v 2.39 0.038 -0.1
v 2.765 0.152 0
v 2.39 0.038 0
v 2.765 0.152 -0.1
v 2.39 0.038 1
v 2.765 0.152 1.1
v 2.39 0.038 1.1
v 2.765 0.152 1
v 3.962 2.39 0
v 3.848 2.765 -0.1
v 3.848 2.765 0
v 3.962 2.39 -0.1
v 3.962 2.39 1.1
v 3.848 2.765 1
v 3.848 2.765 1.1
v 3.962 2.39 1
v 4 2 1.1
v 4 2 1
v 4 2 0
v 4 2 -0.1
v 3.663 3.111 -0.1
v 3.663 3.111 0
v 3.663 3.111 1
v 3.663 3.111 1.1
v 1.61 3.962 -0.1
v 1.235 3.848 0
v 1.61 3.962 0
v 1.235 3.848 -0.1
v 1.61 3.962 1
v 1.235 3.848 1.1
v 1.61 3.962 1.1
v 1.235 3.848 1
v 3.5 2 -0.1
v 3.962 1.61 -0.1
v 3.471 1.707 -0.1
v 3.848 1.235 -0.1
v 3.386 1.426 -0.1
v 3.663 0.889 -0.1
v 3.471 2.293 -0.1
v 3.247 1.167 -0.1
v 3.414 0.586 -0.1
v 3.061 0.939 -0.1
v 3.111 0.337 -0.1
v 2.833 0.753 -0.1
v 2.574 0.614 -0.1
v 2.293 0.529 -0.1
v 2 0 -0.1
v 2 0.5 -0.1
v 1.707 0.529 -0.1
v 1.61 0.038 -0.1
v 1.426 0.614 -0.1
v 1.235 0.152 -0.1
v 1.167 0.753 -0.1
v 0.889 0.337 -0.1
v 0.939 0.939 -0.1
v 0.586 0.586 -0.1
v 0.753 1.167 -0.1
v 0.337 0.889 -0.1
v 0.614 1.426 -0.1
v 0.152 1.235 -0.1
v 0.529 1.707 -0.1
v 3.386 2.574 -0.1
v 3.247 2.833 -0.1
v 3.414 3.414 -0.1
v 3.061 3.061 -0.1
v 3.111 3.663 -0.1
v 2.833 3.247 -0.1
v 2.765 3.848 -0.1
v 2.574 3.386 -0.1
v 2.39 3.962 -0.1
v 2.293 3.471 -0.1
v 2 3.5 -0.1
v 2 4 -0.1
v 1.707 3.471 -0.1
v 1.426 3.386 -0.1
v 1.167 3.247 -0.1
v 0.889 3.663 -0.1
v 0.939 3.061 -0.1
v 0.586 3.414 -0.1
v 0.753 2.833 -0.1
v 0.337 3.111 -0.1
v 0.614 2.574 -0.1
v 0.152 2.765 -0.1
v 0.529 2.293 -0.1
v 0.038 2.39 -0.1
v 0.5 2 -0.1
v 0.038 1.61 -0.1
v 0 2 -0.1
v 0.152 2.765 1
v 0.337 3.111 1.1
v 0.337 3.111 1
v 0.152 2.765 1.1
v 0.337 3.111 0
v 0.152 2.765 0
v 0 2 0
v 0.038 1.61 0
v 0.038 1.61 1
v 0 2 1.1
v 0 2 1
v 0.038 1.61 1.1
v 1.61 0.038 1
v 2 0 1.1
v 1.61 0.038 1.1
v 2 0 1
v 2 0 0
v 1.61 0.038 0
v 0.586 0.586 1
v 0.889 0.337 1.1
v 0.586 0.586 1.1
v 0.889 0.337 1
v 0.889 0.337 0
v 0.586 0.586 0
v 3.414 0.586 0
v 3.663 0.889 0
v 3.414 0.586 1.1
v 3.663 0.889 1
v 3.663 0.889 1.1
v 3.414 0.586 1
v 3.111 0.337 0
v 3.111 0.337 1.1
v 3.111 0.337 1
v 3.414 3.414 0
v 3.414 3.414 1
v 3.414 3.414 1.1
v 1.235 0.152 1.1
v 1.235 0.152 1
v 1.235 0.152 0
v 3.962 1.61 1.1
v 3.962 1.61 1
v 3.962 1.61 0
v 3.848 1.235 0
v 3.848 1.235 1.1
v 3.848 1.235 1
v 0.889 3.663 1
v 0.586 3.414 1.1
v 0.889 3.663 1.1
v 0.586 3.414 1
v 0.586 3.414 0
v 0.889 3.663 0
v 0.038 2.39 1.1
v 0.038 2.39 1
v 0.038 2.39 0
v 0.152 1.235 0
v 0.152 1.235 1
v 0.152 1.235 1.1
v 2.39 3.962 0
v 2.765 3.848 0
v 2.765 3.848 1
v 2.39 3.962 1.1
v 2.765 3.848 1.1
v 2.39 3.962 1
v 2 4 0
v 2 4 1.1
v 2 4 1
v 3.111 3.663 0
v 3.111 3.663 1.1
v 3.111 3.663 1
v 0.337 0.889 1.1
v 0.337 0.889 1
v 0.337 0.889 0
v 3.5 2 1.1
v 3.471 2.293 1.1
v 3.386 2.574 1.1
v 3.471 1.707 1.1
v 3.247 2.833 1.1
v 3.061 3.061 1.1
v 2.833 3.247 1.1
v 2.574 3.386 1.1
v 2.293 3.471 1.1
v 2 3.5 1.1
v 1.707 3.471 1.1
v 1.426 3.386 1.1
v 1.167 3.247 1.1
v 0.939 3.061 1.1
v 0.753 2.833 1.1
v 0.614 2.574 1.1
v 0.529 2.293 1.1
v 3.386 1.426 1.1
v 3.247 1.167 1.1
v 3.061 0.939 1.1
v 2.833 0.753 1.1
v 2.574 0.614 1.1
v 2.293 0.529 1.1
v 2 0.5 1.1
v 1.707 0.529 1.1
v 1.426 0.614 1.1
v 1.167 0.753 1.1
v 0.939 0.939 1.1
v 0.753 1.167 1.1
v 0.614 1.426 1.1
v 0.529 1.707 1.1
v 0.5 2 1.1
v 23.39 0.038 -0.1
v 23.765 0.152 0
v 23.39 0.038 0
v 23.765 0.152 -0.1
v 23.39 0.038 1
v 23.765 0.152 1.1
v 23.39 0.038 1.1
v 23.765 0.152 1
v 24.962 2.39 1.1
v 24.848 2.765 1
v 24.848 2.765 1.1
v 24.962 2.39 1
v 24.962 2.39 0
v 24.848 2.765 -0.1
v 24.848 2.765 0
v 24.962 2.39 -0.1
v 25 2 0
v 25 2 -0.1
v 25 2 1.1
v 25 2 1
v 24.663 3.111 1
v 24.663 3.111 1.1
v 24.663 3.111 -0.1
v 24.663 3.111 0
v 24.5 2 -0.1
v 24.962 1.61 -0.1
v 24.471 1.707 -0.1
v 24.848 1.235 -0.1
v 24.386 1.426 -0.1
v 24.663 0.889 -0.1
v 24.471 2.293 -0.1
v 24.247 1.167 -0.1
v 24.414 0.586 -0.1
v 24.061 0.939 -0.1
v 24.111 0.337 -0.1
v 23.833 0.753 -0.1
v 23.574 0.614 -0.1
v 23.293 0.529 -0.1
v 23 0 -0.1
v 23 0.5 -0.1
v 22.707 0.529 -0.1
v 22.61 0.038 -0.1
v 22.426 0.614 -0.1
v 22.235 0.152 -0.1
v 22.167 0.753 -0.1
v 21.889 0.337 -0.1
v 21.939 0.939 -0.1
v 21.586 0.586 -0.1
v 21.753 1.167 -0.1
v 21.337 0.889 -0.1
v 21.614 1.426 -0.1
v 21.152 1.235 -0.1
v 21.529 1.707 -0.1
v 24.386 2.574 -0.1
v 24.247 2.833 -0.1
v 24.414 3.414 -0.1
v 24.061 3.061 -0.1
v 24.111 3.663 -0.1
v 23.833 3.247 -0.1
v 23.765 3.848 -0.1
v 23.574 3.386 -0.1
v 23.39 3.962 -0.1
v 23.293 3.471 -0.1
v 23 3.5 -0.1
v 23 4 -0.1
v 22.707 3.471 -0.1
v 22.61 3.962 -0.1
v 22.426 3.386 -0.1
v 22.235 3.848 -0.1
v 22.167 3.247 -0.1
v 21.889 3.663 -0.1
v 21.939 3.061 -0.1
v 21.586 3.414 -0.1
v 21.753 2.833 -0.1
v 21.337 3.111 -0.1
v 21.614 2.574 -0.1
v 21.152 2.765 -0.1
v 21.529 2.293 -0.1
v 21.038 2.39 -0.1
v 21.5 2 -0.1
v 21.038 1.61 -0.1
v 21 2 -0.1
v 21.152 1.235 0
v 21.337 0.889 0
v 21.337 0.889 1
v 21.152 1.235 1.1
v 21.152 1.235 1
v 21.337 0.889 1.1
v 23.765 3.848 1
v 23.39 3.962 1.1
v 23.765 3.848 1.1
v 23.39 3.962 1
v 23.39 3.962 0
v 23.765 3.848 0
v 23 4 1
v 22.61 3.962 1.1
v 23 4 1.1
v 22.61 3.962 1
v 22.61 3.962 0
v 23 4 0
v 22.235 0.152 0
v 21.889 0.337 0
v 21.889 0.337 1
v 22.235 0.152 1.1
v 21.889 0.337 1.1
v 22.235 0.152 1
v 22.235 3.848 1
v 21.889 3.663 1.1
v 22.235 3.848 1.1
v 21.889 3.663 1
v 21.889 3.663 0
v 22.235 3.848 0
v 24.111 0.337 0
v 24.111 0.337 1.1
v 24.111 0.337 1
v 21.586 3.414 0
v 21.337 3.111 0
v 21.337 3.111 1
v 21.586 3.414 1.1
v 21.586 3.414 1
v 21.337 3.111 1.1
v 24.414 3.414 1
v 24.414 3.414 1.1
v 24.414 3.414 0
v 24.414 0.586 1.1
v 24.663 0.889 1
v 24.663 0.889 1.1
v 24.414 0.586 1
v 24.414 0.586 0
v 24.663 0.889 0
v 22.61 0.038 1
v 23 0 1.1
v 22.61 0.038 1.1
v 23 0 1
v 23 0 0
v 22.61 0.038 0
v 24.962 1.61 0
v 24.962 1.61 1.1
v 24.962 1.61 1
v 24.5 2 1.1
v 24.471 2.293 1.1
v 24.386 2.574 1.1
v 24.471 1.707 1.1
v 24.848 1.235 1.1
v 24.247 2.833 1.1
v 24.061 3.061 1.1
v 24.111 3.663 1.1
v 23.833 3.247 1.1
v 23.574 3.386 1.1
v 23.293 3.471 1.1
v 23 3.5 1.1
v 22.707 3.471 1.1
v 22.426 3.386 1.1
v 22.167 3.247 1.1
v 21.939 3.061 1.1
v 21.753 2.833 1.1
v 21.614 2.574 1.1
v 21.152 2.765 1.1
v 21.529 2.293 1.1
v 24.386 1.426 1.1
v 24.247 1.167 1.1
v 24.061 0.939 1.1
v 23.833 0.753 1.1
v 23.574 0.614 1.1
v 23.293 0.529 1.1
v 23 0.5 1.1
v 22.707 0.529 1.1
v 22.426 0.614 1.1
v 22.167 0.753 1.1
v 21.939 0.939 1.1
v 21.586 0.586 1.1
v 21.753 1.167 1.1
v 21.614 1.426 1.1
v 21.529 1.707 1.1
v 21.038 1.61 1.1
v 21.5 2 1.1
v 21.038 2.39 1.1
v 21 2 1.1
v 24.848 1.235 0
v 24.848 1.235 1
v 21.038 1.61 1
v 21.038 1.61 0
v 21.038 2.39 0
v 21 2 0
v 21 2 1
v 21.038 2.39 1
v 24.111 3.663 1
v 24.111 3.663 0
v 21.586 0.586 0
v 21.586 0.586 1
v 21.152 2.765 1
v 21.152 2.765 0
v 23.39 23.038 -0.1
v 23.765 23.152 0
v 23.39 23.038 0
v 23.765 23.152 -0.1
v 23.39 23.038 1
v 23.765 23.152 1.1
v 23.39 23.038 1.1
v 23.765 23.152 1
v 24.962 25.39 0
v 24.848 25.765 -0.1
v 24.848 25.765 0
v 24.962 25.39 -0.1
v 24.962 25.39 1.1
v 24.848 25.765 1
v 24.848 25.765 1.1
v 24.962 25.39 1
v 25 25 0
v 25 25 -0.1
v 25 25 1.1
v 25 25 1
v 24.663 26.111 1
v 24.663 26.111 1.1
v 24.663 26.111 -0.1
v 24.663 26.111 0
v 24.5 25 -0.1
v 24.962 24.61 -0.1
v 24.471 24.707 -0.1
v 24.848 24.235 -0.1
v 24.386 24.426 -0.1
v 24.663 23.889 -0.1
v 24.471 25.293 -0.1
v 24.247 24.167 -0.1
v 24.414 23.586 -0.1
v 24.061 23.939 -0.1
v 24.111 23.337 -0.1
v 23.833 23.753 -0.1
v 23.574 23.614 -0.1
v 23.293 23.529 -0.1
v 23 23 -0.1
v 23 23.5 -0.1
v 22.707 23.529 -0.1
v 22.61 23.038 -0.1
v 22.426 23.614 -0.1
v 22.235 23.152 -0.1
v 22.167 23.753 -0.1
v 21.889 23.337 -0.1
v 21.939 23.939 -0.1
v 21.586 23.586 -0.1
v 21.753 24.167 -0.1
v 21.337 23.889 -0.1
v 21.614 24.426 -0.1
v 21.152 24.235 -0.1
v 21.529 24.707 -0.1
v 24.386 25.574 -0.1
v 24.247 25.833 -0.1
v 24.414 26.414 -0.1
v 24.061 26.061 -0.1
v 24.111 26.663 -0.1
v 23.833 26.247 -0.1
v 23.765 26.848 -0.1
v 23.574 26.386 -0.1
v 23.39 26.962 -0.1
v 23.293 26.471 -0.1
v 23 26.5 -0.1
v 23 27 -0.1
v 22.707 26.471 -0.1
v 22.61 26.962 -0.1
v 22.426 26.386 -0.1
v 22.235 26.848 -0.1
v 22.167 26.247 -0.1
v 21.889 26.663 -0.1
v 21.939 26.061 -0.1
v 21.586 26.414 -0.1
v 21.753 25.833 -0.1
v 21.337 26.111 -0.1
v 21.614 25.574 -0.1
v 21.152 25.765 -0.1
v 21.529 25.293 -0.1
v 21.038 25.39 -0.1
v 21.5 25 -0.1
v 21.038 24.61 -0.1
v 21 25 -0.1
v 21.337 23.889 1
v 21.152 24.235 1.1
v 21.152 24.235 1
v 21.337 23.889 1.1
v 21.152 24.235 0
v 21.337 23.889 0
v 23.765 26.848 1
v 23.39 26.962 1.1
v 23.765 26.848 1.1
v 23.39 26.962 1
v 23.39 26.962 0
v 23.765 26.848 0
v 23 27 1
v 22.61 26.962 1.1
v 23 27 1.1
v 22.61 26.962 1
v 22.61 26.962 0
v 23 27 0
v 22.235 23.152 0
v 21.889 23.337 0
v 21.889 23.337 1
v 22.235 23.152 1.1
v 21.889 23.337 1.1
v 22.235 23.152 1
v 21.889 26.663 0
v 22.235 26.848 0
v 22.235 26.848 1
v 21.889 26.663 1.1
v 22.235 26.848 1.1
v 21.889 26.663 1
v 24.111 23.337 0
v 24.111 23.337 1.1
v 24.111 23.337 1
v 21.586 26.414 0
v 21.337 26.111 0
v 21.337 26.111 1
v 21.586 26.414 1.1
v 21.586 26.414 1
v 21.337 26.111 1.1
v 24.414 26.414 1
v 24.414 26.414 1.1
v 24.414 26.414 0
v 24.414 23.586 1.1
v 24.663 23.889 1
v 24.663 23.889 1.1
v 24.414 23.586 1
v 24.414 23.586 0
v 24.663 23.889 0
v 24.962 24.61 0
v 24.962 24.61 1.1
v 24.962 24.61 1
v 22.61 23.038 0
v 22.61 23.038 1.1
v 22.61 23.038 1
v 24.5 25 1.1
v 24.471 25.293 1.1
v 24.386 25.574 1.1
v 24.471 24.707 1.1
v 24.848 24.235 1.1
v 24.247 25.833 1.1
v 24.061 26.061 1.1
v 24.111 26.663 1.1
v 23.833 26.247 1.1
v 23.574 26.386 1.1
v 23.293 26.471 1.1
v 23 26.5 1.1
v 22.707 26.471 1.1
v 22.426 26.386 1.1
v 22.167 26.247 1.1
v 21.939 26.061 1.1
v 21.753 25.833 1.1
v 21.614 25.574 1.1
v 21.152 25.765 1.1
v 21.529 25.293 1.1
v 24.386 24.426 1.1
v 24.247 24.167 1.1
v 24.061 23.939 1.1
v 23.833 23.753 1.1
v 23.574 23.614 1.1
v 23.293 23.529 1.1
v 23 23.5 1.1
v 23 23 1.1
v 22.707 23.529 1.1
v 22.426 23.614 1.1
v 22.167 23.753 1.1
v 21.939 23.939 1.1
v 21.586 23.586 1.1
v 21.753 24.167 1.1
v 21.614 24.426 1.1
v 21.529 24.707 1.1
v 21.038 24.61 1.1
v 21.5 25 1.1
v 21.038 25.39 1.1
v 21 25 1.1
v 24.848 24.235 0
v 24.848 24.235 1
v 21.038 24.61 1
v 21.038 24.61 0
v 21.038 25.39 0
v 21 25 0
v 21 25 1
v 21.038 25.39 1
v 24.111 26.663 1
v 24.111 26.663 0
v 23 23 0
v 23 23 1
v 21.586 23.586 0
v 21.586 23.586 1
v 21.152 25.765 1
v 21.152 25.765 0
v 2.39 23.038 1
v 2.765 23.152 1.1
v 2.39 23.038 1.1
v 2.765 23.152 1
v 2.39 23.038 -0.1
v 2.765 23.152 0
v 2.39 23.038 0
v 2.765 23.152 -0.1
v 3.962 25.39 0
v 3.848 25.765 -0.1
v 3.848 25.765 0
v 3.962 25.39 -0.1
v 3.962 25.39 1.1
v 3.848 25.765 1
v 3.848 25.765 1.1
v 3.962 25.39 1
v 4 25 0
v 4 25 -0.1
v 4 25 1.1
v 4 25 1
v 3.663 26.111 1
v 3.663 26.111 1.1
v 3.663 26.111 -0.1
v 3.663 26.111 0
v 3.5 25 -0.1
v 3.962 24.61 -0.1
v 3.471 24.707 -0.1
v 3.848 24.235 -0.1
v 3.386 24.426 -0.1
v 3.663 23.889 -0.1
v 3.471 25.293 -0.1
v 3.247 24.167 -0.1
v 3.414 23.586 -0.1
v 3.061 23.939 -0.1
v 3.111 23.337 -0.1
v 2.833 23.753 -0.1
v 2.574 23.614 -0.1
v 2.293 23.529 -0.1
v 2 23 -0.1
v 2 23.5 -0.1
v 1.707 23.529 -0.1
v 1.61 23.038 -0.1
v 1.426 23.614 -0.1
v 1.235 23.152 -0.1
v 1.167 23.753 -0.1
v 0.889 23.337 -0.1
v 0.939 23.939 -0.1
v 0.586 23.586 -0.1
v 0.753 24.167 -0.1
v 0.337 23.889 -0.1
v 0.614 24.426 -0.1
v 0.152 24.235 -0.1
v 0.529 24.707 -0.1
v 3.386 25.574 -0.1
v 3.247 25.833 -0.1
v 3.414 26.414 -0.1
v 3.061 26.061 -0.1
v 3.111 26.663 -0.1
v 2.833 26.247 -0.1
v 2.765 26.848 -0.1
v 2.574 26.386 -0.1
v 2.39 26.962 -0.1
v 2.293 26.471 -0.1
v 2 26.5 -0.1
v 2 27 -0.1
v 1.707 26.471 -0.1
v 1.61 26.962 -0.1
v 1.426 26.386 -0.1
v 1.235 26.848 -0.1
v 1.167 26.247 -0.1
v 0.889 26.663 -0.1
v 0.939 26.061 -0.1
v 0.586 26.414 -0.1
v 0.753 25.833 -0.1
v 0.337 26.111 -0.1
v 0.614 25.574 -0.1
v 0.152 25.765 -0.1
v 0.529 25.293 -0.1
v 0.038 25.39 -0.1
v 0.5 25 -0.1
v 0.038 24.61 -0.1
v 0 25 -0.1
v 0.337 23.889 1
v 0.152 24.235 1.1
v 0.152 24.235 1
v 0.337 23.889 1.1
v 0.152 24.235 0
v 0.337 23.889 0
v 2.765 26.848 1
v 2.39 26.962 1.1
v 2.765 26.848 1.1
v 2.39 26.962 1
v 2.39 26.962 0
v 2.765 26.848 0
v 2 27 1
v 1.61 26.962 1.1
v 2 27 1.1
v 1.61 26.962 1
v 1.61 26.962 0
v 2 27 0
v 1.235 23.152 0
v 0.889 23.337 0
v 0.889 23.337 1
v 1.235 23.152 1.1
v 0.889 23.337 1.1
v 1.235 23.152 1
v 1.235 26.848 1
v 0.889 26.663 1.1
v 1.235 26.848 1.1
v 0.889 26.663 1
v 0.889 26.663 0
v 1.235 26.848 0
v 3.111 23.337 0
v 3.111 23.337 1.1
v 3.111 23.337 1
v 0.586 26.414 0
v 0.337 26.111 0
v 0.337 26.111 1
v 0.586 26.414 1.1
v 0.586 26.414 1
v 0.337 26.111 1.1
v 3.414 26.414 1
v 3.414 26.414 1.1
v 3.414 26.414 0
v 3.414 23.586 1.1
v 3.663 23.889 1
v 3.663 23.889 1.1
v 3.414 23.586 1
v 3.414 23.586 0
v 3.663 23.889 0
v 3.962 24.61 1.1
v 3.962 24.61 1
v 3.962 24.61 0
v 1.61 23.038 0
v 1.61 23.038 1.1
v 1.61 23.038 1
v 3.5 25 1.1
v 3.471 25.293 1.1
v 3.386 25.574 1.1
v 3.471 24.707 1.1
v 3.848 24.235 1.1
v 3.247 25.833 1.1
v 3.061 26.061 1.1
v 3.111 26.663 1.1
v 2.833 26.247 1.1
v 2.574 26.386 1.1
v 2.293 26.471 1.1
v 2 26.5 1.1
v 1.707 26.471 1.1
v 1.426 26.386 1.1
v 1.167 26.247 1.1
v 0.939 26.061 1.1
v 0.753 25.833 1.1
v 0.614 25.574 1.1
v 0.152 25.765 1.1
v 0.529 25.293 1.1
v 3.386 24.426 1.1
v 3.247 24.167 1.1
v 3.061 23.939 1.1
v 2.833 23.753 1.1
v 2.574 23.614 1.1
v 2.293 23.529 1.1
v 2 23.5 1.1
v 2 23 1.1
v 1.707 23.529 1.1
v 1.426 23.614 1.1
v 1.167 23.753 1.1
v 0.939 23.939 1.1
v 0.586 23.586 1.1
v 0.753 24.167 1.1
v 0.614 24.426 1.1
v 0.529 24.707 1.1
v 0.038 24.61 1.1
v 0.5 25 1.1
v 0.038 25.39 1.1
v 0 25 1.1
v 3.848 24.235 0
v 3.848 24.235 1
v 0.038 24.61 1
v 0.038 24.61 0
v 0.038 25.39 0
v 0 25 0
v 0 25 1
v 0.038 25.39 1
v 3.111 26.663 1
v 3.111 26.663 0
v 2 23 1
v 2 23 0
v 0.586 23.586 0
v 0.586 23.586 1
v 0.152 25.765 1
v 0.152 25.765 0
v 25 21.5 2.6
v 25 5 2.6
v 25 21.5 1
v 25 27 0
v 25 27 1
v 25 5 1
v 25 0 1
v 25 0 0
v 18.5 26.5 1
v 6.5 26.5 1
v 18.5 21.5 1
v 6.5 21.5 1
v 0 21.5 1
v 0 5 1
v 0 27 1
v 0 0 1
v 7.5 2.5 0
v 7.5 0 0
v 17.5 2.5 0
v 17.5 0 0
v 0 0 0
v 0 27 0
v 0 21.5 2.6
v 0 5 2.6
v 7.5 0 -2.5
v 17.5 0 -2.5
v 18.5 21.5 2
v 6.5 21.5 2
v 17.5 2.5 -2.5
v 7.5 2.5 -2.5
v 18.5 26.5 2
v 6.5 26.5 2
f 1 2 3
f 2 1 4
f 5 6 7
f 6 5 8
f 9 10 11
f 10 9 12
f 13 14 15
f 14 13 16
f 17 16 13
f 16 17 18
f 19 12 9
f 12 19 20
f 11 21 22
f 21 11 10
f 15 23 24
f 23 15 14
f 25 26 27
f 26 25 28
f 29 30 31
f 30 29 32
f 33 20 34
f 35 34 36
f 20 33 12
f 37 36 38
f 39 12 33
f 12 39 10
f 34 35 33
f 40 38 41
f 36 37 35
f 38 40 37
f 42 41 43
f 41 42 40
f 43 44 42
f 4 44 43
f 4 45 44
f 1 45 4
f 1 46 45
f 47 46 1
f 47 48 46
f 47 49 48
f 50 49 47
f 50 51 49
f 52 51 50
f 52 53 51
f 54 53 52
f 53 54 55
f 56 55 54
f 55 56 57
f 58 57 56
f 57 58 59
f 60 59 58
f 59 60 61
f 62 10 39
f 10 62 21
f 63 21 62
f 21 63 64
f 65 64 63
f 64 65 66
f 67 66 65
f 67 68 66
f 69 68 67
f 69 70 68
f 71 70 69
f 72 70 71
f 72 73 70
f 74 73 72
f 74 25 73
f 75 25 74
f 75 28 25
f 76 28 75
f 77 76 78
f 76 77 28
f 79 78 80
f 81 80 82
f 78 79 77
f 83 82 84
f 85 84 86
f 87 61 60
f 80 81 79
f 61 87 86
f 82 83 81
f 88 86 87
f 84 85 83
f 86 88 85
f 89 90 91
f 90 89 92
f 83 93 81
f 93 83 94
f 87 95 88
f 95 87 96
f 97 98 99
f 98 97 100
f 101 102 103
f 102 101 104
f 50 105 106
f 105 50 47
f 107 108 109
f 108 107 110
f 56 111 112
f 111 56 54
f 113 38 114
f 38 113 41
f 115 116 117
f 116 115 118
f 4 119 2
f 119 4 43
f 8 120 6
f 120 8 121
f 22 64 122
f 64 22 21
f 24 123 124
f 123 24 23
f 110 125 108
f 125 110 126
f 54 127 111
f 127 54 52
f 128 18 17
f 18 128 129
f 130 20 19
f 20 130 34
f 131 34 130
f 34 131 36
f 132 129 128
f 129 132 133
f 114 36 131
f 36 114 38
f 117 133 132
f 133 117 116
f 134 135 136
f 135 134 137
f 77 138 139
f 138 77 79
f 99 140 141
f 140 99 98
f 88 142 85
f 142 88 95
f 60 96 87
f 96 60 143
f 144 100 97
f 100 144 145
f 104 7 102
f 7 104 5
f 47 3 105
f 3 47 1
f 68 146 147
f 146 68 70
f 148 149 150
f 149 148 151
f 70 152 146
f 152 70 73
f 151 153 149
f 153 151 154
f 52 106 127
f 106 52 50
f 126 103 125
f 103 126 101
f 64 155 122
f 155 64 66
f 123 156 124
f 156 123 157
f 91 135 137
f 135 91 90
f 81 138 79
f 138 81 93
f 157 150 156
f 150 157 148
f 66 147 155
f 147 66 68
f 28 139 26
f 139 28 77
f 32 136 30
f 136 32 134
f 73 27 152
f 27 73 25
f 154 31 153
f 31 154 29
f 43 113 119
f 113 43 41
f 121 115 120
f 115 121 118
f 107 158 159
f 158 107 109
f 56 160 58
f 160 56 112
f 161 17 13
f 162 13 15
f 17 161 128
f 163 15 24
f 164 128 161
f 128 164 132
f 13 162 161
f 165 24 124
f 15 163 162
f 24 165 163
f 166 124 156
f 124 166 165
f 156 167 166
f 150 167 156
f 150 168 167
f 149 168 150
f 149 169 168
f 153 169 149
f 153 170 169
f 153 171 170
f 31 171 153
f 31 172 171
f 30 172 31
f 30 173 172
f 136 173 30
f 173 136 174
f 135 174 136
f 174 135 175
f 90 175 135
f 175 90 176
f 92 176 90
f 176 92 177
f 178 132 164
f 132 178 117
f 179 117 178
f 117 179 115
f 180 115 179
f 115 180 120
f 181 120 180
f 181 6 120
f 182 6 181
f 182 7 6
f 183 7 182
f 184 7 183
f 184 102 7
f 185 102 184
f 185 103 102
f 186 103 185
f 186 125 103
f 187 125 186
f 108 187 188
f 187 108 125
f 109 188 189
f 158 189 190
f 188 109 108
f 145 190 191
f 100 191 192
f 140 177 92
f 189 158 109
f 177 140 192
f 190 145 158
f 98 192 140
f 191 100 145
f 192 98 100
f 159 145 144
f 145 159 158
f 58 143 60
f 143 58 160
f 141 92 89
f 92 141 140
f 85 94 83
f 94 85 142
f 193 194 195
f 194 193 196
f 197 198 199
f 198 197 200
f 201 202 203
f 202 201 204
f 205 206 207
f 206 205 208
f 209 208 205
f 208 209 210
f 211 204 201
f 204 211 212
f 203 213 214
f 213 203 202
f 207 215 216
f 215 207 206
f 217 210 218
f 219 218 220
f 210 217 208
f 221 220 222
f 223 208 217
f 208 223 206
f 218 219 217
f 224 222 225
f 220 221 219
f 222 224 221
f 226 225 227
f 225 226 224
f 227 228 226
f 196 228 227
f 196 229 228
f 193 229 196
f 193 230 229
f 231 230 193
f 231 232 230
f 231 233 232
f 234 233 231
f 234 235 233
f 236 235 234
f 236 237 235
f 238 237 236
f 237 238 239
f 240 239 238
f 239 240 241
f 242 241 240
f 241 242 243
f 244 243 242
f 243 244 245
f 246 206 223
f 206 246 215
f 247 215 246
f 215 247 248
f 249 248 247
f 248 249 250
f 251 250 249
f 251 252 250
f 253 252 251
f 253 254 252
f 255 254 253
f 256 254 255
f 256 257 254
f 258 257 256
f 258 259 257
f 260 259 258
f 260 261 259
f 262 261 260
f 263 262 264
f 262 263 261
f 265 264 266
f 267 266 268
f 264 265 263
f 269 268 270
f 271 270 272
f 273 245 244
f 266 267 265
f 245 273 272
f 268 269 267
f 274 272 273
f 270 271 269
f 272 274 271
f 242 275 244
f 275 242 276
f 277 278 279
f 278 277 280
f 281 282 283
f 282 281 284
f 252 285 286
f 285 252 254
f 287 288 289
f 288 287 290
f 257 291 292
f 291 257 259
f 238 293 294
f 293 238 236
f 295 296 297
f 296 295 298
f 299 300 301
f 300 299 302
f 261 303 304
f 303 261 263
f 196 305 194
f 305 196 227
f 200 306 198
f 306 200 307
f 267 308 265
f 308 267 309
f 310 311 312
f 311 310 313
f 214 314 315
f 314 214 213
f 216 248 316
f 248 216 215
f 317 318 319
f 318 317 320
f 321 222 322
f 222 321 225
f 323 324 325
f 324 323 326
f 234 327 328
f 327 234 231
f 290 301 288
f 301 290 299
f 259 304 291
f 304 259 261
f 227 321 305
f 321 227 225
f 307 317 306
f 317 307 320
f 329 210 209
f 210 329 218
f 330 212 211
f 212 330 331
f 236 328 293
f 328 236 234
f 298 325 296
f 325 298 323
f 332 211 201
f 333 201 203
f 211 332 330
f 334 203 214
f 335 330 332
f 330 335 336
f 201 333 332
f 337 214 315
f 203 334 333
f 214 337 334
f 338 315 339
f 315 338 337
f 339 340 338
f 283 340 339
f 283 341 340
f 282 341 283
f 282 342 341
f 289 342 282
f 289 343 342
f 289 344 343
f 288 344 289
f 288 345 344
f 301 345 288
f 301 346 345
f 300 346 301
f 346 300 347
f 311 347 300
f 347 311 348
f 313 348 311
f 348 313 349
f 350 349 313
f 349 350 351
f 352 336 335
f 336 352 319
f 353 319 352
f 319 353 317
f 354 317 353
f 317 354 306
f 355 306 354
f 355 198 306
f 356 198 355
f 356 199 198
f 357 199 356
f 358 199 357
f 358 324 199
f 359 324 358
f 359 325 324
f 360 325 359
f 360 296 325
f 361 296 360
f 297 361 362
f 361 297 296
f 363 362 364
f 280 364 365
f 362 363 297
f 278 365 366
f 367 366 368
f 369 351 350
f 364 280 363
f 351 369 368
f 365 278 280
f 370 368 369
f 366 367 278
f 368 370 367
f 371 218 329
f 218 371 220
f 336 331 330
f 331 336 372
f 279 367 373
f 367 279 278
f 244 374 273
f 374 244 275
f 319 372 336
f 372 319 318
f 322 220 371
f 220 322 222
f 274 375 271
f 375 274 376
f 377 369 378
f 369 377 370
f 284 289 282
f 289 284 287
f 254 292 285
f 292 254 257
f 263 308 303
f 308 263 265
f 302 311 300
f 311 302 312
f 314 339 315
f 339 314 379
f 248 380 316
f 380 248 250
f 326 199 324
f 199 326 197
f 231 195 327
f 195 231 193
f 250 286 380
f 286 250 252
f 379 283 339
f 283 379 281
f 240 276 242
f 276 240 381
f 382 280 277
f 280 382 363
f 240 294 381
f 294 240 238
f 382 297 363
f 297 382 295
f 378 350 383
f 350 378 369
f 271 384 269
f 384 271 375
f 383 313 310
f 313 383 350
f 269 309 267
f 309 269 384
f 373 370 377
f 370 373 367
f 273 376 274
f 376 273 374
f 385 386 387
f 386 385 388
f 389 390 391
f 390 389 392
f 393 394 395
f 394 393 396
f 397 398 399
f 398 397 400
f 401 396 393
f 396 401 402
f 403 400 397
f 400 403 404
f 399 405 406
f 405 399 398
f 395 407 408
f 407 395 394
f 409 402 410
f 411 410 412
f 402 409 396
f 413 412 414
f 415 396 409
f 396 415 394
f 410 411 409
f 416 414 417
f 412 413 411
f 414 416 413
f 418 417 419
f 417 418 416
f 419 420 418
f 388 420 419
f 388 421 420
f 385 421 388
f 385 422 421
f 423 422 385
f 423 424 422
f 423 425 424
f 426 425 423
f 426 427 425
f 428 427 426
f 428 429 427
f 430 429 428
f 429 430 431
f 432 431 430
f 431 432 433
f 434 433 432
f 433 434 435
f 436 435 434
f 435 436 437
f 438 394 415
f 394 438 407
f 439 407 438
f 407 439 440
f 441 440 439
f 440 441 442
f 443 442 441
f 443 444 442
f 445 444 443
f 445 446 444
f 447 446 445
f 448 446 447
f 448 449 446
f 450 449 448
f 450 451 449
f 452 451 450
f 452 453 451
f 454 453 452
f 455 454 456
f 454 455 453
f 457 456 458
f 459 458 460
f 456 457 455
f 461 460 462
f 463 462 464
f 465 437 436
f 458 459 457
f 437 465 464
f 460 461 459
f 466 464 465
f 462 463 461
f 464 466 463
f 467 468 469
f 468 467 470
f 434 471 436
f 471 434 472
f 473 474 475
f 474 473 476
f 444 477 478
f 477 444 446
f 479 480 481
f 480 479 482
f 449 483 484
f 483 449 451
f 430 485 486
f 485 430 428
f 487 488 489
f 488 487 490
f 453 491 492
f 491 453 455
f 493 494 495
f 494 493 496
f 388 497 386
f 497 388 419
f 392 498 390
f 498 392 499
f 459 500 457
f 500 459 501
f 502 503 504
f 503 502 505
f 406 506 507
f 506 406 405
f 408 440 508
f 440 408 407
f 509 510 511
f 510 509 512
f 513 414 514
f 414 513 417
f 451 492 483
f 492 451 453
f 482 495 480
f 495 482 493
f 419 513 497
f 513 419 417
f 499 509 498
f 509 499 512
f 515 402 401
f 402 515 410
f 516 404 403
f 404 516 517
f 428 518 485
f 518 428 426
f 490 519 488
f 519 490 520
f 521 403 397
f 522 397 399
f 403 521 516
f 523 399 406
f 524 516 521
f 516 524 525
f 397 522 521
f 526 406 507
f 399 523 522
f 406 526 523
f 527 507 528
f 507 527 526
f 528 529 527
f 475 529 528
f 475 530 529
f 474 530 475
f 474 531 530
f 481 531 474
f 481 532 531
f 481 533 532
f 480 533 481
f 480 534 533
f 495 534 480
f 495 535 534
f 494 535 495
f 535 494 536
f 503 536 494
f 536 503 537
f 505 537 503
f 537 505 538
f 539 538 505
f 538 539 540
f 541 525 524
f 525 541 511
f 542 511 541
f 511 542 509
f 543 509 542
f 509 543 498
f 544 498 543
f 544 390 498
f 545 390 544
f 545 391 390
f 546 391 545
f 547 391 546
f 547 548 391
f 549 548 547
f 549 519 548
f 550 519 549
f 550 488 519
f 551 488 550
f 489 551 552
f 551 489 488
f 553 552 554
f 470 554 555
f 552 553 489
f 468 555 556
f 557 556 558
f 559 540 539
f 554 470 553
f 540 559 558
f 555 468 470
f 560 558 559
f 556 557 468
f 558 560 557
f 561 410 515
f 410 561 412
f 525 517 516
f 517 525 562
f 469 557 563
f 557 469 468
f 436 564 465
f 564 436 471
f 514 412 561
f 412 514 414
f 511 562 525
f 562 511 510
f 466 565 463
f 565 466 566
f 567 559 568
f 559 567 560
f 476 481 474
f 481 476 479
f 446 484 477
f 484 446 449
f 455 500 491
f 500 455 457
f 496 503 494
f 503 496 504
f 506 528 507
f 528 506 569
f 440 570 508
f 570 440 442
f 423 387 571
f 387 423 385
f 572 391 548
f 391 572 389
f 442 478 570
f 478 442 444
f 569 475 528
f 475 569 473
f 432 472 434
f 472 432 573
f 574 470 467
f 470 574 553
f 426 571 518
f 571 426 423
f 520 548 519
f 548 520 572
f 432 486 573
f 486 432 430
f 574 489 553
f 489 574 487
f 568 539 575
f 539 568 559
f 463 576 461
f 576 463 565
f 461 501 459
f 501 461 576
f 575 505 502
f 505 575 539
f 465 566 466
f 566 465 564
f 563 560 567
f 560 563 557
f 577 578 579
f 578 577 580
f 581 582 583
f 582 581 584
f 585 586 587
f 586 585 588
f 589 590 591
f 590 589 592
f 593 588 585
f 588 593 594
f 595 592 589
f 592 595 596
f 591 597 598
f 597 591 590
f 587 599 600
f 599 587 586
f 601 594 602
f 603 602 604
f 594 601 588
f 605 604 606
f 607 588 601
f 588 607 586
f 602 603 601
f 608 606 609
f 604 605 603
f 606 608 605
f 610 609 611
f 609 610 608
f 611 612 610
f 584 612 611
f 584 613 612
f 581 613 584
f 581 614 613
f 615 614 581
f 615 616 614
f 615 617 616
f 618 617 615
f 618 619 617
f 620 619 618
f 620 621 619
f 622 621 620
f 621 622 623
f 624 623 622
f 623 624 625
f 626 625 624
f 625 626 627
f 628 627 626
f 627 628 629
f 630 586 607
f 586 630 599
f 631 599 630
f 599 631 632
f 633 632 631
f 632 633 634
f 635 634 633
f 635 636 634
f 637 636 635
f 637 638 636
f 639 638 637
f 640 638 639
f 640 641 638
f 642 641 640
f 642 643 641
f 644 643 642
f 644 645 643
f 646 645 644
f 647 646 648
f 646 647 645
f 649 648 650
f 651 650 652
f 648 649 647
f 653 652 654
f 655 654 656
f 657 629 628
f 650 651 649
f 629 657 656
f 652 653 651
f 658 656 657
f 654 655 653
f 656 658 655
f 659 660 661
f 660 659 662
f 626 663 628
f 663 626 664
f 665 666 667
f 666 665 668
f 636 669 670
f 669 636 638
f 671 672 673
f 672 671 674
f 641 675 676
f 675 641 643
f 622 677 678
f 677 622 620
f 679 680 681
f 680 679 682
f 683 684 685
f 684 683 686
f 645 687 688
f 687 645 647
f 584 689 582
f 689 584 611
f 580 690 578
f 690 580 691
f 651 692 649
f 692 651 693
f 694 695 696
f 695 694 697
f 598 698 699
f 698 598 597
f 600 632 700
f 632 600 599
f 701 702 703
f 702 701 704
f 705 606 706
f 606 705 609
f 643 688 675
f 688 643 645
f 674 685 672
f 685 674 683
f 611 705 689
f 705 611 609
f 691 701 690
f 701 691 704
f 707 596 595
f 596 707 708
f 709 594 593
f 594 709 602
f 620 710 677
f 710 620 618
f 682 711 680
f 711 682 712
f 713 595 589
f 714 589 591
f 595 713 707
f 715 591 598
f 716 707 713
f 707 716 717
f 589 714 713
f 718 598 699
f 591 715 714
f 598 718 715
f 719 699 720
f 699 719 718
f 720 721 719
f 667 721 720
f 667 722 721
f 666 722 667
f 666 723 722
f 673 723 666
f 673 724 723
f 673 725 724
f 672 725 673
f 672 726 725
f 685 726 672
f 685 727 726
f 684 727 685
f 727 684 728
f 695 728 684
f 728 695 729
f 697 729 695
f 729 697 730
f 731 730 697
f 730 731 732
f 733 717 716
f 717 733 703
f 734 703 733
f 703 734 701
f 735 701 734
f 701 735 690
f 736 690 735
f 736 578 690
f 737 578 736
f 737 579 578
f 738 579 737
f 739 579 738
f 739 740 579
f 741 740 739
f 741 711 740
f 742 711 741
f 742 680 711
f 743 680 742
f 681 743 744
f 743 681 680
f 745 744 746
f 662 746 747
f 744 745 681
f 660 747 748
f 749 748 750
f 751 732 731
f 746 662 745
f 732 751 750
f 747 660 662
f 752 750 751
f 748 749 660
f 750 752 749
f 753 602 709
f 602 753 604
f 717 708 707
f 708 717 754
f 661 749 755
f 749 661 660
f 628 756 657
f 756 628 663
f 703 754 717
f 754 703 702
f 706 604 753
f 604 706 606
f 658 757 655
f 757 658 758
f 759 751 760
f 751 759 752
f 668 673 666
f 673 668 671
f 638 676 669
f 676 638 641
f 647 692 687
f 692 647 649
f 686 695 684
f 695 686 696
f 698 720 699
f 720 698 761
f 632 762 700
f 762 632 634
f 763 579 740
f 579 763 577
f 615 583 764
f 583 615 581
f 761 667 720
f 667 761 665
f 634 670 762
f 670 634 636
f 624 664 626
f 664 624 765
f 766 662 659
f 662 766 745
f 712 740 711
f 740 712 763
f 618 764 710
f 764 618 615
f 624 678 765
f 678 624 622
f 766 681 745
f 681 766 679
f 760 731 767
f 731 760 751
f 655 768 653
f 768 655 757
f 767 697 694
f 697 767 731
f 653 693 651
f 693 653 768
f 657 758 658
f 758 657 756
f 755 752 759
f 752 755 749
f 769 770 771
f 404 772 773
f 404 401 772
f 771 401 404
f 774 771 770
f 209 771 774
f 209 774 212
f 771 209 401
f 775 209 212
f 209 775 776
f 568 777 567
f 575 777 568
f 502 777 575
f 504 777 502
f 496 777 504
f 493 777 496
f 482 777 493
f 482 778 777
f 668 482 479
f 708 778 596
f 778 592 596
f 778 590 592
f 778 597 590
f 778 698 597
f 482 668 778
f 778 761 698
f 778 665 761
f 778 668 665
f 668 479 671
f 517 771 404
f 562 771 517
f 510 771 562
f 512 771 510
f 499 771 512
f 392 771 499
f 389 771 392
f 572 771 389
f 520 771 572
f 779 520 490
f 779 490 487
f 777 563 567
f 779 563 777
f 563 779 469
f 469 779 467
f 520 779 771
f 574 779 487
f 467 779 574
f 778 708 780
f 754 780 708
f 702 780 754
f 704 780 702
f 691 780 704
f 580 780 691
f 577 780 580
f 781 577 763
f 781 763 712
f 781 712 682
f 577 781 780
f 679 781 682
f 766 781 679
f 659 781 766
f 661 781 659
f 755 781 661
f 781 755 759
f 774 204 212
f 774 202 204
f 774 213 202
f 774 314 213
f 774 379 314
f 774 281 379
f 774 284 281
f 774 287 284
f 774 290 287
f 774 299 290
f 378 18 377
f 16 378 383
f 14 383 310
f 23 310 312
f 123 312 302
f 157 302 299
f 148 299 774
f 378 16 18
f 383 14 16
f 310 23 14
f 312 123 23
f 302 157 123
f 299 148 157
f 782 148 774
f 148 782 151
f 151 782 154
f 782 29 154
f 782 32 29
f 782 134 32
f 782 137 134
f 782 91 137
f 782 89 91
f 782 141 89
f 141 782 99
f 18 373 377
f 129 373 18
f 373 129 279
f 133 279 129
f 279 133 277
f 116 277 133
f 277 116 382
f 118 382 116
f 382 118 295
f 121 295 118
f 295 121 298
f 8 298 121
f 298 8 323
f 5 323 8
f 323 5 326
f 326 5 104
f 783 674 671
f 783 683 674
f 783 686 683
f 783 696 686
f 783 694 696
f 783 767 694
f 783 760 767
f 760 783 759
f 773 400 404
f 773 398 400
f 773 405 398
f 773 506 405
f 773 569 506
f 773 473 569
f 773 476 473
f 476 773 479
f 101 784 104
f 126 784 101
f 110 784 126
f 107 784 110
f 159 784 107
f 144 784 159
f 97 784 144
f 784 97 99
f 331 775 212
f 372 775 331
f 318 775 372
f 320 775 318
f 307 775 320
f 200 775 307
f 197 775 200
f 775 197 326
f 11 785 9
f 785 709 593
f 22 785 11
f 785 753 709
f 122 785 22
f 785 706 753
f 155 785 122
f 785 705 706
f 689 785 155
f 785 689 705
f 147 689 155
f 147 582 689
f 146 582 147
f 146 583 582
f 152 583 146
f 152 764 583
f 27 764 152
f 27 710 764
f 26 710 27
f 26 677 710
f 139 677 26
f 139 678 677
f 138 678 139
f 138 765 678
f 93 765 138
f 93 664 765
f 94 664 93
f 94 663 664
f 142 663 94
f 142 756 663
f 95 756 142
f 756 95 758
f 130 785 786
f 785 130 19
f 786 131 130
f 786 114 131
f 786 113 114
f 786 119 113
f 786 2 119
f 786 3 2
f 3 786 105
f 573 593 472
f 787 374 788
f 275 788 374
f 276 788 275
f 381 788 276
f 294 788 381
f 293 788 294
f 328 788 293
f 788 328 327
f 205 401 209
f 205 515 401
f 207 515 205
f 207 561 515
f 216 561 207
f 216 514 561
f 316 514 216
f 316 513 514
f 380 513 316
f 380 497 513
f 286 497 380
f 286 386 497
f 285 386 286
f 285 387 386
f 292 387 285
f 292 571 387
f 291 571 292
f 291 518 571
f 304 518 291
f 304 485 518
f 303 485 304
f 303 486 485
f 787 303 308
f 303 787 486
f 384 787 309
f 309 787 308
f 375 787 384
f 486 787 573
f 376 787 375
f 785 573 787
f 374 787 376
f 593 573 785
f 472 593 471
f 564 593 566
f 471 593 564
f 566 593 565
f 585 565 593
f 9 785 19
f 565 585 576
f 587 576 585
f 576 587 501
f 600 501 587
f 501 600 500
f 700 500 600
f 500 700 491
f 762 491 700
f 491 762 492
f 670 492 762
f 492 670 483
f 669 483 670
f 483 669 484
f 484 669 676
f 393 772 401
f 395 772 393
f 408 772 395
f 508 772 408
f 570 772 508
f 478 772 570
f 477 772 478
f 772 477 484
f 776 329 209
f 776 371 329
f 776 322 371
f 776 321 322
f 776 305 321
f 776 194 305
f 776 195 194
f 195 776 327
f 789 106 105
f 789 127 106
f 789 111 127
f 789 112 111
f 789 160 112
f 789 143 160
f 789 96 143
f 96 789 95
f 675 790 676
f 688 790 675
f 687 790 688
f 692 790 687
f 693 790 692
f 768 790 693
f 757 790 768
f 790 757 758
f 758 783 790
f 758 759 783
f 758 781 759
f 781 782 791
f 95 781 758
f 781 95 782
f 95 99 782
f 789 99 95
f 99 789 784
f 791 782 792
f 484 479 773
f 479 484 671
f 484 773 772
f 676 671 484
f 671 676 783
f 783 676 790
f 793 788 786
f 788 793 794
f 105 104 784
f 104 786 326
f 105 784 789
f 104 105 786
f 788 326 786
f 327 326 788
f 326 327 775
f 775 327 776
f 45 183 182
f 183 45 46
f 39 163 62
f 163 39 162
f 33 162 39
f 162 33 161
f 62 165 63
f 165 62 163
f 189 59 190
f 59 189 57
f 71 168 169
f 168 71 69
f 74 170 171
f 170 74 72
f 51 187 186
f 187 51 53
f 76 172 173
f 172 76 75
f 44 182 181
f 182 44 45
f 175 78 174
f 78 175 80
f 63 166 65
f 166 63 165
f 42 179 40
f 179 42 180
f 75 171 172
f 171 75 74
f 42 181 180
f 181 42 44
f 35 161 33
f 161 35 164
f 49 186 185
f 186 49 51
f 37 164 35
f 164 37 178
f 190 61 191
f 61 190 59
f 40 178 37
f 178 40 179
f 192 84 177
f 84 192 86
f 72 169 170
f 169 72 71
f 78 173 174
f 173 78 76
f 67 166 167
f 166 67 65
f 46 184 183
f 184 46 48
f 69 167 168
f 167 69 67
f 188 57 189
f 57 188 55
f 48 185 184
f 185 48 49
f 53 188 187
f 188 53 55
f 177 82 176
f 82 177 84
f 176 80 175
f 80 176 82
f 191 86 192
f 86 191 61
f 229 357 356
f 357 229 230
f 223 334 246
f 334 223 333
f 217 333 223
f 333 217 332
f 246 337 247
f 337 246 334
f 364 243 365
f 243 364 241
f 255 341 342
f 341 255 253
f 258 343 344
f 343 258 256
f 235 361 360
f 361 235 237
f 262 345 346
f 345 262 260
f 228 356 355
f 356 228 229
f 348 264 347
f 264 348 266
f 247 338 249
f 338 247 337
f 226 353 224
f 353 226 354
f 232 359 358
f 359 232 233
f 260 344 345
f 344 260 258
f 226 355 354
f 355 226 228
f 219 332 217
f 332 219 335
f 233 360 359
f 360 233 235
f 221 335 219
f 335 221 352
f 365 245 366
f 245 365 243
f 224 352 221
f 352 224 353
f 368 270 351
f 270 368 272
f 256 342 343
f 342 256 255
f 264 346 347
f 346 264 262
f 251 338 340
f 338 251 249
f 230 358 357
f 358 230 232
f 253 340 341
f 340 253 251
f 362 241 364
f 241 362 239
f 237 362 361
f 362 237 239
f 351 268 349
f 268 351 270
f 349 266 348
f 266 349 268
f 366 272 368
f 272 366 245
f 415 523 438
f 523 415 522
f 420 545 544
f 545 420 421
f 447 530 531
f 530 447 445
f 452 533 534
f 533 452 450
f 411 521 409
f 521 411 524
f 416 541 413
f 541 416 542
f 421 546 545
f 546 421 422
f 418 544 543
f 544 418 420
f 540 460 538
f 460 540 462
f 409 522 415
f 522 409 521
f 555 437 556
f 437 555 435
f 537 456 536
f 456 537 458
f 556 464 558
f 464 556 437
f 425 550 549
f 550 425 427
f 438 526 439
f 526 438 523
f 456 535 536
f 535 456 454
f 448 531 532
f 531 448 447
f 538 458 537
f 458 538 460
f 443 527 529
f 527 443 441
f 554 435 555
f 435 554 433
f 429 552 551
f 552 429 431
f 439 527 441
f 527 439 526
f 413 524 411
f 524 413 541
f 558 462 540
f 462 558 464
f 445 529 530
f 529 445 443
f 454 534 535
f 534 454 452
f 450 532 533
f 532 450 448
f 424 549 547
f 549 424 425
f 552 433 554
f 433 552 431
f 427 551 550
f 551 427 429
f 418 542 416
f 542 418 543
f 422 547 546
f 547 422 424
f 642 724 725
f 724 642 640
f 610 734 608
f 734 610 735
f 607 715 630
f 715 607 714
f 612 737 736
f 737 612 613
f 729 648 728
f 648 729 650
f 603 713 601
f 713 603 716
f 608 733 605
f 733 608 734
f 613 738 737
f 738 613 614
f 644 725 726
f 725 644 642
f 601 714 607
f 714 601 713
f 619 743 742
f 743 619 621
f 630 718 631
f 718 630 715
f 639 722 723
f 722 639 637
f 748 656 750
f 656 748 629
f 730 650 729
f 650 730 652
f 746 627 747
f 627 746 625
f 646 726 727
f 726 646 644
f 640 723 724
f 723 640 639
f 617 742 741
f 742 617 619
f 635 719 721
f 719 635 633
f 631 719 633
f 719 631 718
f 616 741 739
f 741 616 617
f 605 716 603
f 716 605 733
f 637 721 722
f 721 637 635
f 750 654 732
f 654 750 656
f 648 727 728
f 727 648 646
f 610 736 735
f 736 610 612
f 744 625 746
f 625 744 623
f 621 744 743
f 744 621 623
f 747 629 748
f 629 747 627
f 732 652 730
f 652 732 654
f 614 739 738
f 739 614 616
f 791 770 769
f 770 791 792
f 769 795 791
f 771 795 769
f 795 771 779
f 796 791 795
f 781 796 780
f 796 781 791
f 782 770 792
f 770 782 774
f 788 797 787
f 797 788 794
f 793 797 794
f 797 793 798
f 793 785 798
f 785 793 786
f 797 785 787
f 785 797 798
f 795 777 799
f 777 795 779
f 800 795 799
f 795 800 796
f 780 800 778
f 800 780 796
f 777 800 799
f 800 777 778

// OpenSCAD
/**
 * Martin Egli
 * 2022-06-26
 */
module arduino_nano() {
    color("Blue") {
        translate([0, 0, 0])
        cube([43.5, 18, 1]);
    }
    color("Silver") {
        translate([-1, 5, 1])
        cube([6, 8, 3]);
    }
    color("Silver") {
        translate([25, 6, 1])
        cube([4, 6, 2.5]);
    }
    color("Black") {
        translate([11, 9, 1])
        rotate([0, 0, -45])
        cube([7, 7, 1]);
    }
    color("Black") {
        translate([3, 0, -2.5])
        cube([38, 2.5, 2.5]);
        translate([3, 18-2.5, -2.5])
        cube([38, 2.5, 2.5]);
    }

}

module rotary_encoder(loc_res = 32) {
    color("Silver") {
        translate([0, 0, 0])
        cube([12, 12, 4]);
        translate([6, 6, 0])
        cylinder(d = 6, h = 10, $fn = loc_res);
        difference() {
            hull() {
                translate([6, 6, 10.5])
                cylinder(d = 6, h = 12, $fn = loc_res);
                translate([6, 6, 10.5+12])
                cylinder(d = 4, h = 1, $fn = loc_res);
            }
            translate([2, 0, 12.5])
            cube([8, 5, 12]);
        }
    }
}

module oled_module(loc_res = 32) {
    difference() {
        union() {
            color("DarkGray") {
                translate([0, 0, 0])
                cube([25, 27, 1]);
            }
            color("Silver") {
                translate([2, 2, -0.1])
                cylinder(d = 4, h= 1.2, $fn = loc_res);
                translate([25-2, 2, -0.1])
                cylinder(d = 4, h= 1.2, $fn = loc_res);
                translate([25-2, 27-2, -0.1])
                cylinder(d = 4, h= 1.2, $fn = loc_res);
                translate([2, 27-2, -0.1])
                cylinder(d = 4, h= 1.2, $fn = loc_res);
            }
        }
        translate([2, 2, -0.3])
        cylinder(d = 3, h= 1.6, $fn = loc_res);
        translate([25-2, 2, -0.2])
        cylinder(d = 3, h= 1.4, $fn = loc_res);
        translate([25-2, 27-2, -0.2])
        cylinder(d = 3, h= 1.4, $fn = loc_res);
        translate([2, 27-2, -0.2])
        cylinder(d = 3, h= 1.4, $fn = loc_res);
    }
    color("Black") {
        translate([0, 5, 1])
        cube([25, 16.5, 1.6]);
    }
    color("Black") {
        translate([15/2, 0, -2.5])
        cube([10, 2.5, 2.5]);
    }
    color("Orange") {
        translate([(25-12)/2, 21.5, 1])
        cube([12, 5, 1]);
    }
}
oled_module();

//rotary_encoder();
//arduino_nano();
